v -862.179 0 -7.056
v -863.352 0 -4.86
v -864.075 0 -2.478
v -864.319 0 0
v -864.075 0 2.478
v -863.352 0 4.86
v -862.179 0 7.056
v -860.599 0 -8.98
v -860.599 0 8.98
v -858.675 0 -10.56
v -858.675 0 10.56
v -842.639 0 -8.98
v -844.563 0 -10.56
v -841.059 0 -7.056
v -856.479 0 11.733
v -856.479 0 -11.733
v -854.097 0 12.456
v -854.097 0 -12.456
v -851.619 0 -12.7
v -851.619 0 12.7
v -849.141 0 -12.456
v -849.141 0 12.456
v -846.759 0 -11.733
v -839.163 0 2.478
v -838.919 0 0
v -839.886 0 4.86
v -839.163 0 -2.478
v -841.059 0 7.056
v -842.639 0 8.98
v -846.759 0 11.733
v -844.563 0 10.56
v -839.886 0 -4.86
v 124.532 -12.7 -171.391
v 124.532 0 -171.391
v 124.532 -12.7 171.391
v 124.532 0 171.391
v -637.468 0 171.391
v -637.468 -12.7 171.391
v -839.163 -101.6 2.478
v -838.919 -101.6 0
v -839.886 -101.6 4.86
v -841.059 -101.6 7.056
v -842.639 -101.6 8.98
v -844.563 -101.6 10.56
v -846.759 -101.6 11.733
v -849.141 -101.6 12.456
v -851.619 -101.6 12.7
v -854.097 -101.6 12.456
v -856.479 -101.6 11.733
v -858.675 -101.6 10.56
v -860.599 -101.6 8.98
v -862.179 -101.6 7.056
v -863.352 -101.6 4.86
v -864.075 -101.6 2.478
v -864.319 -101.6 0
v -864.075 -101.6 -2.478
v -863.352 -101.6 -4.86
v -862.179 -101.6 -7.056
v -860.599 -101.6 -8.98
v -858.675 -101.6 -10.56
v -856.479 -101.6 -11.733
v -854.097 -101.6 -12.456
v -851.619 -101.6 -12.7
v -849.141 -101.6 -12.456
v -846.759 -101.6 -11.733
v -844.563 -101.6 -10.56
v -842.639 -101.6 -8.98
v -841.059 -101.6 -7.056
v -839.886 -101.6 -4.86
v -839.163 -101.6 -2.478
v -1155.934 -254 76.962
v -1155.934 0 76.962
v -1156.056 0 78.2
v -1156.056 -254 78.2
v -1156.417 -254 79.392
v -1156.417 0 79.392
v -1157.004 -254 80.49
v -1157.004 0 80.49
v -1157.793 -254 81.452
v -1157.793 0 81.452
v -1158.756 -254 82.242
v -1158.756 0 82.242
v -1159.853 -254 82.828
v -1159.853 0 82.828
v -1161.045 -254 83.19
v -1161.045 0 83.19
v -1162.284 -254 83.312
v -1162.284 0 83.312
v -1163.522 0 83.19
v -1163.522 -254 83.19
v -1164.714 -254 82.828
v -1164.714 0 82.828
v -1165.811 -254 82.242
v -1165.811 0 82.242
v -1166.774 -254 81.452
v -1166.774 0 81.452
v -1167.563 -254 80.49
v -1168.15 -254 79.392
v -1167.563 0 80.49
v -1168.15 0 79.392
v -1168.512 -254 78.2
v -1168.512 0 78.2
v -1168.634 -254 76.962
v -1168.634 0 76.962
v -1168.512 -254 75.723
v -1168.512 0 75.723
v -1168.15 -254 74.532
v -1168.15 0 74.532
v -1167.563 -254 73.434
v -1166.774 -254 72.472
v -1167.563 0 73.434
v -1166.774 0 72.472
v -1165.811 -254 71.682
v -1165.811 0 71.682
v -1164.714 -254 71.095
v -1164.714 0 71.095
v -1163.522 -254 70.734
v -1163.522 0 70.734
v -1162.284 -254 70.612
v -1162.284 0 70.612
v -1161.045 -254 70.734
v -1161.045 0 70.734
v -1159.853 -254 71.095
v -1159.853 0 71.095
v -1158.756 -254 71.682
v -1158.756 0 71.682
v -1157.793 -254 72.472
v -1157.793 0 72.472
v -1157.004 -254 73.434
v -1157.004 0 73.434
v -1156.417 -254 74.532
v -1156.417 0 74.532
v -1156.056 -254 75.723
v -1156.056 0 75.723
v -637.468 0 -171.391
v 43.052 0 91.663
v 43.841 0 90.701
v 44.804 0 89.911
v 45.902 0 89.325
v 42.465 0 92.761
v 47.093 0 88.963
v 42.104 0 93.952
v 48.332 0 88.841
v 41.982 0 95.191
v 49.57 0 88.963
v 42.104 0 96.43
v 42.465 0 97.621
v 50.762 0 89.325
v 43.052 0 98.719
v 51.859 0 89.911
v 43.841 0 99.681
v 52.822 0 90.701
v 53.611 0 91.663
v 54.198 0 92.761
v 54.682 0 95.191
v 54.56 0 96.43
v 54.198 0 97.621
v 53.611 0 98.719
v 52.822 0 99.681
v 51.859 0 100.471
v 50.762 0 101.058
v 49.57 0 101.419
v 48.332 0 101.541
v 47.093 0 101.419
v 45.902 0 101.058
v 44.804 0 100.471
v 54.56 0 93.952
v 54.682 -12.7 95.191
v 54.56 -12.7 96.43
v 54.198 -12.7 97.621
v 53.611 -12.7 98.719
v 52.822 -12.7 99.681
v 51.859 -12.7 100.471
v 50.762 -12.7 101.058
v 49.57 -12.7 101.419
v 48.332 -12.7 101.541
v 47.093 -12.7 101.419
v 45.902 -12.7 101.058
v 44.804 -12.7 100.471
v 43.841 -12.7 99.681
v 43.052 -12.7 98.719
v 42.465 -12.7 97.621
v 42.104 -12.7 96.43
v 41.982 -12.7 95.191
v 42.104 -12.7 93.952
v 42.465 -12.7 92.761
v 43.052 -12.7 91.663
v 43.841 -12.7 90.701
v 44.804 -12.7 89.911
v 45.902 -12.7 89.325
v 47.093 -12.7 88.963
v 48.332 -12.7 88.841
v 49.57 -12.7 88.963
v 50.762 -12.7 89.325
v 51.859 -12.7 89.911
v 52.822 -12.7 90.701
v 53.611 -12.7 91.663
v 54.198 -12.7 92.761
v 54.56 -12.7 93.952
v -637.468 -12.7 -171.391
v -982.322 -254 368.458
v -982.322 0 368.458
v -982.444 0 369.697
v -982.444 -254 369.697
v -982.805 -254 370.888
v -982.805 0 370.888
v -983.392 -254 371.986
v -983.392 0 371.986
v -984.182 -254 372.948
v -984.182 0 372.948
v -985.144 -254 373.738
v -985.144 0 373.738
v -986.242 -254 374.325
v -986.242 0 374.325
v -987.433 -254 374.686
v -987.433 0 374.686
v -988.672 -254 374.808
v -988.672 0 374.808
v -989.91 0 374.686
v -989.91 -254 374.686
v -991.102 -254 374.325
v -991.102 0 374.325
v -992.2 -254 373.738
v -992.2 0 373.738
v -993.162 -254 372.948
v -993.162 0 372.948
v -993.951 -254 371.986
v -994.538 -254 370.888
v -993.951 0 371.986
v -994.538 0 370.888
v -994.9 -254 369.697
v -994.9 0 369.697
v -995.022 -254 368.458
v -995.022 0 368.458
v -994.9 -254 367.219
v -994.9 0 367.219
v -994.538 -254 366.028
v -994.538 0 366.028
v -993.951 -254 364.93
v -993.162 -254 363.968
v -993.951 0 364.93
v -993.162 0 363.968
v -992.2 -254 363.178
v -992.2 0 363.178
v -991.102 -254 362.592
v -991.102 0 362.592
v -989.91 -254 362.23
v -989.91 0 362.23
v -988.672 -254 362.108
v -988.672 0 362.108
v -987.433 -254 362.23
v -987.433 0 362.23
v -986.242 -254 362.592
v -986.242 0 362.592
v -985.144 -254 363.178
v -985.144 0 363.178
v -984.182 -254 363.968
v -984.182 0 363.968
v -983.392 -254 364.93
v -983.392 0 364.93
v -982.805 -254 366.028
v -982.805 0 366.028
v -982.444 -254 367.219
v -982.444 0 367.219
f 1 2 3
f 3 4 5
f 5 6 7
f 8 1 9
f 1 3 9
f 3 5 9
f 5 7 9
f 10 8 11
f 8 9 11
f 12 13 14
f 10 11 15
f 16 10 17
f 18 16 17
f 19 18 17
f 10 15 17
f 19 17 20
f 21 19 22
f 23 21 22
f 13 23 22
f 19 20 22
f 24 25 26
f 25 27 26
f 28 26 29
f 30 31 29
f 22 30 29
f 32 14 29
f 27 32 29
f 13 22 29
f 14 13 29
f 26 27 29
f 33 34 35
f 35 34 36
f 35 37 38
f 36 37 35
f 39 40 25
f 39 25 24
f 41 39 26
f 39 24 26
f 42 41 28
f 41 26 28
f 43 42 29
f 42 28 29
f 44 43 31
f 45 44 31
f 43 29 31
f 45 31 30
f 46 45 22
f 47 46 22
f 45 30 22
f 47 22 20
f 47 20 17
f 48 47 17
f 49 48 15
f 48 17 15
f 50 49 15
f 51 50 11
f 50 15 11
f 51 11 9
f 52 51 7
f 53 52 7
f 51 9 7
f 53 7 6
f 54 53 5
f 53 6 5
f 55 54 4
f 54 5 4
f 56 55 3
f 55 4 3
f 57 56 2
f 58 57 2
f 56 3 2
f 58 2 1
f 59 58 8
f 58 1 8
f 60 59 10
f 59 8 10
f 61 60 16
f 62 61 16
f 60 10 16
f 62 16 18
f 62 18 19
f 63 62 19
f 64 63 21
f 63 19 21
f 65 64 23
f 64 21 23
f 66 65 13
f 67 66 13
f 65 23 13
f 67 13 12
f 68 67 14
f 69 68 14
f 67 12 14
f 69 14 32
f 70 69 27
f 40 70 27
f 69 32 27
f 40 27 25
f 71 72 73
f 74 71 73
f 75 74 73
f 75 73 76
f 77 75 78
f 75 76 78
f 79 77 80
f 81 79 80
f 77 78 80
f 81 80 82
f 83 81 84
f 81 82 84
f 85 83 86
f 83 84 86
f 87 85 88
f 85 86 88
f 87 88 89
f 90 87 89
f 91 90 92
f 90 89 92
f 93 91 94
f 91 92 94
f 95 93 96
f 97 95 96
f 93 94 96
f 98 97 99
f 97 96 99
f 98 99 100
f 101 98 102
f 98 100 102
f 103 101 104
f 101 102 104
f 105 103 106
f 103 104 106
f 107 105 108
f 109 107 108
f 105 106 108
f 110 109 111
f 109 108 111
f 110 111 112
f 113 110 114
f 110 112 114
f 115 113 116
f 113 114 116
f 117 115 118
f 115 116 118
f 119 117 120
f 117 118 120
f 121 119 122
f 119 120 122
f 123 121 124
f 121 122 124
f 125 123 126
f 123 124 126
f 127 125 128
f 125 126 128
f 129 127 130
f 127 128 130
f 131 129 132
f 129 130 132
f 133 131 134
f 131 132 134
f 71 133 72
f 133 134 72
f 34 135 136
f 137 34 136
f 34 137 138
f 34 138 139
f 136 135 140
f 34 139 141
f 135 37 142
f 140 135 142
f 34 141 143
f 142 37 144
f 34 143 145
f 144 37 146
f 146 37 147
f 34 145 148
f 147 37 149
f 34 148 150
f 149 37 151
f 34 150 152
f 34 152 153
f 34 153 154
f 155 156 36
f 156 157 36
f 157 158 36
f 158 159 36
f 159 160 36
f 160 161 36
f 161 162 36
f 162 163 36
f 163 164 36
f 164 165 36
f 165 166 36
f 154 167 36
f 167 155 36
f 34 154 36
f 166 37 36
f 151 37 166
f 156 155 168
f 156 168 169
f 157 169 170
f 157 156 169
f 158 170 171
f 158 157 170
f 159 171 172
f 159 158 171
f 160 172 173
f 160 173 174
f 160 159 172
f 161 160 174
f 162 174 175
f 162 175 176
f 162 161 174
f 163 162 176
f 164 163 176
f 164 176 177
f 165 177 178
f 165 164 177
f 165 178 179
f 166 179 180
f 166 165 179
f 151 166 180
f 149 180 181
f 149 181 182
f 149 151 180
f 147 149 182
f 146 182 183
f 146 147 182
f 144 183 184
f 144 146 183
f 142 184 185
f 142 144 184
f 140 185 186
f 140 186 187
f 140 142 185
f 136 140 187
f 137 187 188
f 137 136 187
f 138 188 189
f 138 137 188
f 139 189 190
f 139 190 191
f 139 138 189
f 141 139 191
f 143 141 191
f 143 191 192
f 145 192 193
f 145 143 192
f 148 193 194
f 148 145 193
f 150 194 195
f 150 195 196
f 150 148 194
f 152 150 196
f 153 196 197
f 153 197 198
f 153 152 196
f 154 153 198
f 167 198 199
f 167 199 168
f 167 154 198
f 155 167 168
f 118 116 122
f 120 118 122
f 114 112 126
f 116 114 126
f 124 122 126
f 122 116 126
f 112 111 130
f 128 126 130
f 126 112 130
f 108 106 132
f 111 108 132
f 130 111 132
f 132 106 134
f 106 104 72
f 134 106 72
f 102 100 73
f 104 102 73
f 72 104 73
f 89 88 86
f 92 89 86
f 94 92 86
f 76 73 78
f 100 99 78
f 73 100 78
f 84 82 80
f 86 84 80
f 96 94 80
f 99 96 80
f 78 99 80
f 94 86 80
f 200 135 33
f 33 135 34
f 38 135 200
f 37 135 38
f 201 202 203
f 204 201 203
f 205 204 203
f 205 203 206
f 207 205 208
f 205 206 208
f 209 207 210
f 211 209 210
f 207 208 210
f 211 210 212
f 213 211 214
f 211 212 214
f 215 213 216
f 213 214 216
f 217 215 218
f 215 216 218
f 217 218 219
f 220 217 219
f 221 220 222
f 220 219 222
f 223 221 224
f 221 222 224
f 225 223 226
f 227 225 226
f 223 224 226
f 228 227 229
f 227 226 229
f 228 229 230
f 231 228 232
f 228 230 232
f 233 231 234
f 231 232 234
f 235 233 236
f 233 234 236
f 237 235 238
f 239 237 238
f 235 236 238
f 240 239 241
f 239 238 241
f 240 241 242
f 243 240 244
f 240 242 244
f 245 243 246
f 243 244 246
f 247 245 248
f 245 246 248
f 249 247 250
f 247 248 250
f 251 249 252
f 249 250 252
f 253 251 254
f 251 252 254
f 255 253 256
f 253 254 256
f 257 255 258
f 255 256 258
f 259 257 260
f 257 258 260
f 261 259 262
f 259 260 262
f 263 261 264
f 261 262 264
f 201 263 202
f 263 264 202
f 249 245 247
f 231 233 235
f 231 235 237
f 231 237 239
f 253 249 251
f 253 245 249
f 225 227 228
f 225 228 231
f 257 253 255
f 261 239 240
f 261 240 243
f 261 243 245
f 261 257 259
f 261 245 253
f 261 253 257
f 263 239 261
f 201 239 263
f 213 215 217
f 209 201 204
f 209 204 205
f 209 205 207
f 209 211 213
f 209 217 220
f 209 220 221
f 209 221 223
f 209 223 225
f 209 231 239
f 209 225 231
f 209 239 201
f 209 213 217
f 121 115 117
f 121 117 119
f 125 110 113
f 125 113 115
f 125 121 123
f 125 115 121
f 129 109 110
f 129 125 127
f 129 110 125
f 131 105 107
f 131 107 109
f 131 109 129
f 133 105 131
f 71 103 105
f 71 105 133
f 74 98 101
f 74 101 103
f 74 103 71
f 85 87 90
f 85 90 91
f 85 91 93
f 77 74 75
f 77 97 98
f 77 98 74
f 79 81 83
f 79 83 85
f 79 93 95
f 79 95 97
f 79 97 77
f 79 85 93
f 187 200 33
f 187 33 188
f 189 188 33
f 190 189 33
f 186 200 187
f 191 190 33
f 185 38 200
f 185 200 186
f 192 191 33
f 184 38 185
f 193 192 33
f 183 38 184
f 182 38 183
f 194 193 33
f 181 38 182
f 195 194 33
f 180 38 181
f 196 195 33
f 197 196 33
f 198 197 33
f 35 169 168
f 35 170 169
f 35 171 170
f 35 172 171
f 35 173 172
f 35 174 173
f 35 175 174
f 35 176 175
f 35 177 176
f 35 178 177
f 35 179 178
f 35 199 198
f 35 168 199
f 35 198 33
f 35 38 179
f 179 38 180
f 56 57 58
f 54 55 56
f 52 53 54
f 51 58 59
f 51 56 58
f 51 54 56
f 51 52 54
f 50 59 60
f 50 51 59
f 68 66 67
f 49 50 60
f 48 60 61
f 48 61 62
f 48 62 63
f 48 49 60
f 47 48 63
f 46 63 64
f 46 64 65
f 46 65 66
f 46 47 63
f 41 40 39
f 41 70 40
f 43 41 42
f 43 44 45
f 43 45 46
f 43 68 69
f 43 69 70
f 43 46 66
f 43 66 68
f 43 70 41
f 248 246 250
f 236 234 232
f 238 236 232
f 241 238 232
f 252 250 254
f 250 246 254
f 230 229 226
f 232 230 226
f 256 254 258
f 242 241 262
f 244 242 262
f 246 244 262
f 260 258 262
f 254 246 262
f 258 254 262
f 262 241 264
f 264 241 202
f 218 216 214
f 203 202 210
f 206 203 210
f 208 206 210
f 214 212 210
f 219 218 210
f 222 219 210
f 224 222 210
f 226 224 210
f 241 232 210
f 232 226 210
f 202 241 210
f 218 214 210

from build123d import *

# Parameters (mm, degrees)
F0_W     = 762
F0_H     = 342.7822869062
F0_R     = 6.35
F1_DEPTH = 12.7
F2_R     = 12.7
F3_DEPTH = 101.6
F4_DEPTH = 254


# Not quite as in the source:
# - the program builds the solid bodies; features that only make, move or delete a surface that nothing else refers to are left out


with BuildPart() as f1:
    # F0 (on Front) → F1 (new body)
    with BuildSketch(Plane.XZ):
        with Locations((-256.4684061597, 0)):
            Rectangle(F0_W, F0_H)
        with Locations((48.3315938403, 95.1911434531)):
            Circle(F0_R, mode=Mode.SUBTRACT)
    extrude(amount=F1_DEPTH)


with BuildPart() as f3:
    # F2 (on Front) → F3 (new body)
    with BuildSketch(Plane.XZ):
        with Locations((-851.6189455986, 0)):
            Circle(F2_R)
    extrude(amount=F3_DEPTH)


with BuildPart() as f4:
    # F0 (on Front) → F4 (new body)
    with BuildSketch(Plane.XZ):
        with Locations((-988.6716604233, 368.4581816196)):
            Circle(F0_R)
    extrude(amount=F4_DEPTH)


with BuildPart() as f4b:
    # F0 (on Front) → F4, piece 2 (new body)
    with BuildSketch(Plane.XZ):
        with Locations((-1162.283539772, 76.9616737962)):
            Circle(F0_R)
    extrude(amount=F4_DEPTH)


solid = Compound([f1.part, f3.part, f4.part, f4b.part])
